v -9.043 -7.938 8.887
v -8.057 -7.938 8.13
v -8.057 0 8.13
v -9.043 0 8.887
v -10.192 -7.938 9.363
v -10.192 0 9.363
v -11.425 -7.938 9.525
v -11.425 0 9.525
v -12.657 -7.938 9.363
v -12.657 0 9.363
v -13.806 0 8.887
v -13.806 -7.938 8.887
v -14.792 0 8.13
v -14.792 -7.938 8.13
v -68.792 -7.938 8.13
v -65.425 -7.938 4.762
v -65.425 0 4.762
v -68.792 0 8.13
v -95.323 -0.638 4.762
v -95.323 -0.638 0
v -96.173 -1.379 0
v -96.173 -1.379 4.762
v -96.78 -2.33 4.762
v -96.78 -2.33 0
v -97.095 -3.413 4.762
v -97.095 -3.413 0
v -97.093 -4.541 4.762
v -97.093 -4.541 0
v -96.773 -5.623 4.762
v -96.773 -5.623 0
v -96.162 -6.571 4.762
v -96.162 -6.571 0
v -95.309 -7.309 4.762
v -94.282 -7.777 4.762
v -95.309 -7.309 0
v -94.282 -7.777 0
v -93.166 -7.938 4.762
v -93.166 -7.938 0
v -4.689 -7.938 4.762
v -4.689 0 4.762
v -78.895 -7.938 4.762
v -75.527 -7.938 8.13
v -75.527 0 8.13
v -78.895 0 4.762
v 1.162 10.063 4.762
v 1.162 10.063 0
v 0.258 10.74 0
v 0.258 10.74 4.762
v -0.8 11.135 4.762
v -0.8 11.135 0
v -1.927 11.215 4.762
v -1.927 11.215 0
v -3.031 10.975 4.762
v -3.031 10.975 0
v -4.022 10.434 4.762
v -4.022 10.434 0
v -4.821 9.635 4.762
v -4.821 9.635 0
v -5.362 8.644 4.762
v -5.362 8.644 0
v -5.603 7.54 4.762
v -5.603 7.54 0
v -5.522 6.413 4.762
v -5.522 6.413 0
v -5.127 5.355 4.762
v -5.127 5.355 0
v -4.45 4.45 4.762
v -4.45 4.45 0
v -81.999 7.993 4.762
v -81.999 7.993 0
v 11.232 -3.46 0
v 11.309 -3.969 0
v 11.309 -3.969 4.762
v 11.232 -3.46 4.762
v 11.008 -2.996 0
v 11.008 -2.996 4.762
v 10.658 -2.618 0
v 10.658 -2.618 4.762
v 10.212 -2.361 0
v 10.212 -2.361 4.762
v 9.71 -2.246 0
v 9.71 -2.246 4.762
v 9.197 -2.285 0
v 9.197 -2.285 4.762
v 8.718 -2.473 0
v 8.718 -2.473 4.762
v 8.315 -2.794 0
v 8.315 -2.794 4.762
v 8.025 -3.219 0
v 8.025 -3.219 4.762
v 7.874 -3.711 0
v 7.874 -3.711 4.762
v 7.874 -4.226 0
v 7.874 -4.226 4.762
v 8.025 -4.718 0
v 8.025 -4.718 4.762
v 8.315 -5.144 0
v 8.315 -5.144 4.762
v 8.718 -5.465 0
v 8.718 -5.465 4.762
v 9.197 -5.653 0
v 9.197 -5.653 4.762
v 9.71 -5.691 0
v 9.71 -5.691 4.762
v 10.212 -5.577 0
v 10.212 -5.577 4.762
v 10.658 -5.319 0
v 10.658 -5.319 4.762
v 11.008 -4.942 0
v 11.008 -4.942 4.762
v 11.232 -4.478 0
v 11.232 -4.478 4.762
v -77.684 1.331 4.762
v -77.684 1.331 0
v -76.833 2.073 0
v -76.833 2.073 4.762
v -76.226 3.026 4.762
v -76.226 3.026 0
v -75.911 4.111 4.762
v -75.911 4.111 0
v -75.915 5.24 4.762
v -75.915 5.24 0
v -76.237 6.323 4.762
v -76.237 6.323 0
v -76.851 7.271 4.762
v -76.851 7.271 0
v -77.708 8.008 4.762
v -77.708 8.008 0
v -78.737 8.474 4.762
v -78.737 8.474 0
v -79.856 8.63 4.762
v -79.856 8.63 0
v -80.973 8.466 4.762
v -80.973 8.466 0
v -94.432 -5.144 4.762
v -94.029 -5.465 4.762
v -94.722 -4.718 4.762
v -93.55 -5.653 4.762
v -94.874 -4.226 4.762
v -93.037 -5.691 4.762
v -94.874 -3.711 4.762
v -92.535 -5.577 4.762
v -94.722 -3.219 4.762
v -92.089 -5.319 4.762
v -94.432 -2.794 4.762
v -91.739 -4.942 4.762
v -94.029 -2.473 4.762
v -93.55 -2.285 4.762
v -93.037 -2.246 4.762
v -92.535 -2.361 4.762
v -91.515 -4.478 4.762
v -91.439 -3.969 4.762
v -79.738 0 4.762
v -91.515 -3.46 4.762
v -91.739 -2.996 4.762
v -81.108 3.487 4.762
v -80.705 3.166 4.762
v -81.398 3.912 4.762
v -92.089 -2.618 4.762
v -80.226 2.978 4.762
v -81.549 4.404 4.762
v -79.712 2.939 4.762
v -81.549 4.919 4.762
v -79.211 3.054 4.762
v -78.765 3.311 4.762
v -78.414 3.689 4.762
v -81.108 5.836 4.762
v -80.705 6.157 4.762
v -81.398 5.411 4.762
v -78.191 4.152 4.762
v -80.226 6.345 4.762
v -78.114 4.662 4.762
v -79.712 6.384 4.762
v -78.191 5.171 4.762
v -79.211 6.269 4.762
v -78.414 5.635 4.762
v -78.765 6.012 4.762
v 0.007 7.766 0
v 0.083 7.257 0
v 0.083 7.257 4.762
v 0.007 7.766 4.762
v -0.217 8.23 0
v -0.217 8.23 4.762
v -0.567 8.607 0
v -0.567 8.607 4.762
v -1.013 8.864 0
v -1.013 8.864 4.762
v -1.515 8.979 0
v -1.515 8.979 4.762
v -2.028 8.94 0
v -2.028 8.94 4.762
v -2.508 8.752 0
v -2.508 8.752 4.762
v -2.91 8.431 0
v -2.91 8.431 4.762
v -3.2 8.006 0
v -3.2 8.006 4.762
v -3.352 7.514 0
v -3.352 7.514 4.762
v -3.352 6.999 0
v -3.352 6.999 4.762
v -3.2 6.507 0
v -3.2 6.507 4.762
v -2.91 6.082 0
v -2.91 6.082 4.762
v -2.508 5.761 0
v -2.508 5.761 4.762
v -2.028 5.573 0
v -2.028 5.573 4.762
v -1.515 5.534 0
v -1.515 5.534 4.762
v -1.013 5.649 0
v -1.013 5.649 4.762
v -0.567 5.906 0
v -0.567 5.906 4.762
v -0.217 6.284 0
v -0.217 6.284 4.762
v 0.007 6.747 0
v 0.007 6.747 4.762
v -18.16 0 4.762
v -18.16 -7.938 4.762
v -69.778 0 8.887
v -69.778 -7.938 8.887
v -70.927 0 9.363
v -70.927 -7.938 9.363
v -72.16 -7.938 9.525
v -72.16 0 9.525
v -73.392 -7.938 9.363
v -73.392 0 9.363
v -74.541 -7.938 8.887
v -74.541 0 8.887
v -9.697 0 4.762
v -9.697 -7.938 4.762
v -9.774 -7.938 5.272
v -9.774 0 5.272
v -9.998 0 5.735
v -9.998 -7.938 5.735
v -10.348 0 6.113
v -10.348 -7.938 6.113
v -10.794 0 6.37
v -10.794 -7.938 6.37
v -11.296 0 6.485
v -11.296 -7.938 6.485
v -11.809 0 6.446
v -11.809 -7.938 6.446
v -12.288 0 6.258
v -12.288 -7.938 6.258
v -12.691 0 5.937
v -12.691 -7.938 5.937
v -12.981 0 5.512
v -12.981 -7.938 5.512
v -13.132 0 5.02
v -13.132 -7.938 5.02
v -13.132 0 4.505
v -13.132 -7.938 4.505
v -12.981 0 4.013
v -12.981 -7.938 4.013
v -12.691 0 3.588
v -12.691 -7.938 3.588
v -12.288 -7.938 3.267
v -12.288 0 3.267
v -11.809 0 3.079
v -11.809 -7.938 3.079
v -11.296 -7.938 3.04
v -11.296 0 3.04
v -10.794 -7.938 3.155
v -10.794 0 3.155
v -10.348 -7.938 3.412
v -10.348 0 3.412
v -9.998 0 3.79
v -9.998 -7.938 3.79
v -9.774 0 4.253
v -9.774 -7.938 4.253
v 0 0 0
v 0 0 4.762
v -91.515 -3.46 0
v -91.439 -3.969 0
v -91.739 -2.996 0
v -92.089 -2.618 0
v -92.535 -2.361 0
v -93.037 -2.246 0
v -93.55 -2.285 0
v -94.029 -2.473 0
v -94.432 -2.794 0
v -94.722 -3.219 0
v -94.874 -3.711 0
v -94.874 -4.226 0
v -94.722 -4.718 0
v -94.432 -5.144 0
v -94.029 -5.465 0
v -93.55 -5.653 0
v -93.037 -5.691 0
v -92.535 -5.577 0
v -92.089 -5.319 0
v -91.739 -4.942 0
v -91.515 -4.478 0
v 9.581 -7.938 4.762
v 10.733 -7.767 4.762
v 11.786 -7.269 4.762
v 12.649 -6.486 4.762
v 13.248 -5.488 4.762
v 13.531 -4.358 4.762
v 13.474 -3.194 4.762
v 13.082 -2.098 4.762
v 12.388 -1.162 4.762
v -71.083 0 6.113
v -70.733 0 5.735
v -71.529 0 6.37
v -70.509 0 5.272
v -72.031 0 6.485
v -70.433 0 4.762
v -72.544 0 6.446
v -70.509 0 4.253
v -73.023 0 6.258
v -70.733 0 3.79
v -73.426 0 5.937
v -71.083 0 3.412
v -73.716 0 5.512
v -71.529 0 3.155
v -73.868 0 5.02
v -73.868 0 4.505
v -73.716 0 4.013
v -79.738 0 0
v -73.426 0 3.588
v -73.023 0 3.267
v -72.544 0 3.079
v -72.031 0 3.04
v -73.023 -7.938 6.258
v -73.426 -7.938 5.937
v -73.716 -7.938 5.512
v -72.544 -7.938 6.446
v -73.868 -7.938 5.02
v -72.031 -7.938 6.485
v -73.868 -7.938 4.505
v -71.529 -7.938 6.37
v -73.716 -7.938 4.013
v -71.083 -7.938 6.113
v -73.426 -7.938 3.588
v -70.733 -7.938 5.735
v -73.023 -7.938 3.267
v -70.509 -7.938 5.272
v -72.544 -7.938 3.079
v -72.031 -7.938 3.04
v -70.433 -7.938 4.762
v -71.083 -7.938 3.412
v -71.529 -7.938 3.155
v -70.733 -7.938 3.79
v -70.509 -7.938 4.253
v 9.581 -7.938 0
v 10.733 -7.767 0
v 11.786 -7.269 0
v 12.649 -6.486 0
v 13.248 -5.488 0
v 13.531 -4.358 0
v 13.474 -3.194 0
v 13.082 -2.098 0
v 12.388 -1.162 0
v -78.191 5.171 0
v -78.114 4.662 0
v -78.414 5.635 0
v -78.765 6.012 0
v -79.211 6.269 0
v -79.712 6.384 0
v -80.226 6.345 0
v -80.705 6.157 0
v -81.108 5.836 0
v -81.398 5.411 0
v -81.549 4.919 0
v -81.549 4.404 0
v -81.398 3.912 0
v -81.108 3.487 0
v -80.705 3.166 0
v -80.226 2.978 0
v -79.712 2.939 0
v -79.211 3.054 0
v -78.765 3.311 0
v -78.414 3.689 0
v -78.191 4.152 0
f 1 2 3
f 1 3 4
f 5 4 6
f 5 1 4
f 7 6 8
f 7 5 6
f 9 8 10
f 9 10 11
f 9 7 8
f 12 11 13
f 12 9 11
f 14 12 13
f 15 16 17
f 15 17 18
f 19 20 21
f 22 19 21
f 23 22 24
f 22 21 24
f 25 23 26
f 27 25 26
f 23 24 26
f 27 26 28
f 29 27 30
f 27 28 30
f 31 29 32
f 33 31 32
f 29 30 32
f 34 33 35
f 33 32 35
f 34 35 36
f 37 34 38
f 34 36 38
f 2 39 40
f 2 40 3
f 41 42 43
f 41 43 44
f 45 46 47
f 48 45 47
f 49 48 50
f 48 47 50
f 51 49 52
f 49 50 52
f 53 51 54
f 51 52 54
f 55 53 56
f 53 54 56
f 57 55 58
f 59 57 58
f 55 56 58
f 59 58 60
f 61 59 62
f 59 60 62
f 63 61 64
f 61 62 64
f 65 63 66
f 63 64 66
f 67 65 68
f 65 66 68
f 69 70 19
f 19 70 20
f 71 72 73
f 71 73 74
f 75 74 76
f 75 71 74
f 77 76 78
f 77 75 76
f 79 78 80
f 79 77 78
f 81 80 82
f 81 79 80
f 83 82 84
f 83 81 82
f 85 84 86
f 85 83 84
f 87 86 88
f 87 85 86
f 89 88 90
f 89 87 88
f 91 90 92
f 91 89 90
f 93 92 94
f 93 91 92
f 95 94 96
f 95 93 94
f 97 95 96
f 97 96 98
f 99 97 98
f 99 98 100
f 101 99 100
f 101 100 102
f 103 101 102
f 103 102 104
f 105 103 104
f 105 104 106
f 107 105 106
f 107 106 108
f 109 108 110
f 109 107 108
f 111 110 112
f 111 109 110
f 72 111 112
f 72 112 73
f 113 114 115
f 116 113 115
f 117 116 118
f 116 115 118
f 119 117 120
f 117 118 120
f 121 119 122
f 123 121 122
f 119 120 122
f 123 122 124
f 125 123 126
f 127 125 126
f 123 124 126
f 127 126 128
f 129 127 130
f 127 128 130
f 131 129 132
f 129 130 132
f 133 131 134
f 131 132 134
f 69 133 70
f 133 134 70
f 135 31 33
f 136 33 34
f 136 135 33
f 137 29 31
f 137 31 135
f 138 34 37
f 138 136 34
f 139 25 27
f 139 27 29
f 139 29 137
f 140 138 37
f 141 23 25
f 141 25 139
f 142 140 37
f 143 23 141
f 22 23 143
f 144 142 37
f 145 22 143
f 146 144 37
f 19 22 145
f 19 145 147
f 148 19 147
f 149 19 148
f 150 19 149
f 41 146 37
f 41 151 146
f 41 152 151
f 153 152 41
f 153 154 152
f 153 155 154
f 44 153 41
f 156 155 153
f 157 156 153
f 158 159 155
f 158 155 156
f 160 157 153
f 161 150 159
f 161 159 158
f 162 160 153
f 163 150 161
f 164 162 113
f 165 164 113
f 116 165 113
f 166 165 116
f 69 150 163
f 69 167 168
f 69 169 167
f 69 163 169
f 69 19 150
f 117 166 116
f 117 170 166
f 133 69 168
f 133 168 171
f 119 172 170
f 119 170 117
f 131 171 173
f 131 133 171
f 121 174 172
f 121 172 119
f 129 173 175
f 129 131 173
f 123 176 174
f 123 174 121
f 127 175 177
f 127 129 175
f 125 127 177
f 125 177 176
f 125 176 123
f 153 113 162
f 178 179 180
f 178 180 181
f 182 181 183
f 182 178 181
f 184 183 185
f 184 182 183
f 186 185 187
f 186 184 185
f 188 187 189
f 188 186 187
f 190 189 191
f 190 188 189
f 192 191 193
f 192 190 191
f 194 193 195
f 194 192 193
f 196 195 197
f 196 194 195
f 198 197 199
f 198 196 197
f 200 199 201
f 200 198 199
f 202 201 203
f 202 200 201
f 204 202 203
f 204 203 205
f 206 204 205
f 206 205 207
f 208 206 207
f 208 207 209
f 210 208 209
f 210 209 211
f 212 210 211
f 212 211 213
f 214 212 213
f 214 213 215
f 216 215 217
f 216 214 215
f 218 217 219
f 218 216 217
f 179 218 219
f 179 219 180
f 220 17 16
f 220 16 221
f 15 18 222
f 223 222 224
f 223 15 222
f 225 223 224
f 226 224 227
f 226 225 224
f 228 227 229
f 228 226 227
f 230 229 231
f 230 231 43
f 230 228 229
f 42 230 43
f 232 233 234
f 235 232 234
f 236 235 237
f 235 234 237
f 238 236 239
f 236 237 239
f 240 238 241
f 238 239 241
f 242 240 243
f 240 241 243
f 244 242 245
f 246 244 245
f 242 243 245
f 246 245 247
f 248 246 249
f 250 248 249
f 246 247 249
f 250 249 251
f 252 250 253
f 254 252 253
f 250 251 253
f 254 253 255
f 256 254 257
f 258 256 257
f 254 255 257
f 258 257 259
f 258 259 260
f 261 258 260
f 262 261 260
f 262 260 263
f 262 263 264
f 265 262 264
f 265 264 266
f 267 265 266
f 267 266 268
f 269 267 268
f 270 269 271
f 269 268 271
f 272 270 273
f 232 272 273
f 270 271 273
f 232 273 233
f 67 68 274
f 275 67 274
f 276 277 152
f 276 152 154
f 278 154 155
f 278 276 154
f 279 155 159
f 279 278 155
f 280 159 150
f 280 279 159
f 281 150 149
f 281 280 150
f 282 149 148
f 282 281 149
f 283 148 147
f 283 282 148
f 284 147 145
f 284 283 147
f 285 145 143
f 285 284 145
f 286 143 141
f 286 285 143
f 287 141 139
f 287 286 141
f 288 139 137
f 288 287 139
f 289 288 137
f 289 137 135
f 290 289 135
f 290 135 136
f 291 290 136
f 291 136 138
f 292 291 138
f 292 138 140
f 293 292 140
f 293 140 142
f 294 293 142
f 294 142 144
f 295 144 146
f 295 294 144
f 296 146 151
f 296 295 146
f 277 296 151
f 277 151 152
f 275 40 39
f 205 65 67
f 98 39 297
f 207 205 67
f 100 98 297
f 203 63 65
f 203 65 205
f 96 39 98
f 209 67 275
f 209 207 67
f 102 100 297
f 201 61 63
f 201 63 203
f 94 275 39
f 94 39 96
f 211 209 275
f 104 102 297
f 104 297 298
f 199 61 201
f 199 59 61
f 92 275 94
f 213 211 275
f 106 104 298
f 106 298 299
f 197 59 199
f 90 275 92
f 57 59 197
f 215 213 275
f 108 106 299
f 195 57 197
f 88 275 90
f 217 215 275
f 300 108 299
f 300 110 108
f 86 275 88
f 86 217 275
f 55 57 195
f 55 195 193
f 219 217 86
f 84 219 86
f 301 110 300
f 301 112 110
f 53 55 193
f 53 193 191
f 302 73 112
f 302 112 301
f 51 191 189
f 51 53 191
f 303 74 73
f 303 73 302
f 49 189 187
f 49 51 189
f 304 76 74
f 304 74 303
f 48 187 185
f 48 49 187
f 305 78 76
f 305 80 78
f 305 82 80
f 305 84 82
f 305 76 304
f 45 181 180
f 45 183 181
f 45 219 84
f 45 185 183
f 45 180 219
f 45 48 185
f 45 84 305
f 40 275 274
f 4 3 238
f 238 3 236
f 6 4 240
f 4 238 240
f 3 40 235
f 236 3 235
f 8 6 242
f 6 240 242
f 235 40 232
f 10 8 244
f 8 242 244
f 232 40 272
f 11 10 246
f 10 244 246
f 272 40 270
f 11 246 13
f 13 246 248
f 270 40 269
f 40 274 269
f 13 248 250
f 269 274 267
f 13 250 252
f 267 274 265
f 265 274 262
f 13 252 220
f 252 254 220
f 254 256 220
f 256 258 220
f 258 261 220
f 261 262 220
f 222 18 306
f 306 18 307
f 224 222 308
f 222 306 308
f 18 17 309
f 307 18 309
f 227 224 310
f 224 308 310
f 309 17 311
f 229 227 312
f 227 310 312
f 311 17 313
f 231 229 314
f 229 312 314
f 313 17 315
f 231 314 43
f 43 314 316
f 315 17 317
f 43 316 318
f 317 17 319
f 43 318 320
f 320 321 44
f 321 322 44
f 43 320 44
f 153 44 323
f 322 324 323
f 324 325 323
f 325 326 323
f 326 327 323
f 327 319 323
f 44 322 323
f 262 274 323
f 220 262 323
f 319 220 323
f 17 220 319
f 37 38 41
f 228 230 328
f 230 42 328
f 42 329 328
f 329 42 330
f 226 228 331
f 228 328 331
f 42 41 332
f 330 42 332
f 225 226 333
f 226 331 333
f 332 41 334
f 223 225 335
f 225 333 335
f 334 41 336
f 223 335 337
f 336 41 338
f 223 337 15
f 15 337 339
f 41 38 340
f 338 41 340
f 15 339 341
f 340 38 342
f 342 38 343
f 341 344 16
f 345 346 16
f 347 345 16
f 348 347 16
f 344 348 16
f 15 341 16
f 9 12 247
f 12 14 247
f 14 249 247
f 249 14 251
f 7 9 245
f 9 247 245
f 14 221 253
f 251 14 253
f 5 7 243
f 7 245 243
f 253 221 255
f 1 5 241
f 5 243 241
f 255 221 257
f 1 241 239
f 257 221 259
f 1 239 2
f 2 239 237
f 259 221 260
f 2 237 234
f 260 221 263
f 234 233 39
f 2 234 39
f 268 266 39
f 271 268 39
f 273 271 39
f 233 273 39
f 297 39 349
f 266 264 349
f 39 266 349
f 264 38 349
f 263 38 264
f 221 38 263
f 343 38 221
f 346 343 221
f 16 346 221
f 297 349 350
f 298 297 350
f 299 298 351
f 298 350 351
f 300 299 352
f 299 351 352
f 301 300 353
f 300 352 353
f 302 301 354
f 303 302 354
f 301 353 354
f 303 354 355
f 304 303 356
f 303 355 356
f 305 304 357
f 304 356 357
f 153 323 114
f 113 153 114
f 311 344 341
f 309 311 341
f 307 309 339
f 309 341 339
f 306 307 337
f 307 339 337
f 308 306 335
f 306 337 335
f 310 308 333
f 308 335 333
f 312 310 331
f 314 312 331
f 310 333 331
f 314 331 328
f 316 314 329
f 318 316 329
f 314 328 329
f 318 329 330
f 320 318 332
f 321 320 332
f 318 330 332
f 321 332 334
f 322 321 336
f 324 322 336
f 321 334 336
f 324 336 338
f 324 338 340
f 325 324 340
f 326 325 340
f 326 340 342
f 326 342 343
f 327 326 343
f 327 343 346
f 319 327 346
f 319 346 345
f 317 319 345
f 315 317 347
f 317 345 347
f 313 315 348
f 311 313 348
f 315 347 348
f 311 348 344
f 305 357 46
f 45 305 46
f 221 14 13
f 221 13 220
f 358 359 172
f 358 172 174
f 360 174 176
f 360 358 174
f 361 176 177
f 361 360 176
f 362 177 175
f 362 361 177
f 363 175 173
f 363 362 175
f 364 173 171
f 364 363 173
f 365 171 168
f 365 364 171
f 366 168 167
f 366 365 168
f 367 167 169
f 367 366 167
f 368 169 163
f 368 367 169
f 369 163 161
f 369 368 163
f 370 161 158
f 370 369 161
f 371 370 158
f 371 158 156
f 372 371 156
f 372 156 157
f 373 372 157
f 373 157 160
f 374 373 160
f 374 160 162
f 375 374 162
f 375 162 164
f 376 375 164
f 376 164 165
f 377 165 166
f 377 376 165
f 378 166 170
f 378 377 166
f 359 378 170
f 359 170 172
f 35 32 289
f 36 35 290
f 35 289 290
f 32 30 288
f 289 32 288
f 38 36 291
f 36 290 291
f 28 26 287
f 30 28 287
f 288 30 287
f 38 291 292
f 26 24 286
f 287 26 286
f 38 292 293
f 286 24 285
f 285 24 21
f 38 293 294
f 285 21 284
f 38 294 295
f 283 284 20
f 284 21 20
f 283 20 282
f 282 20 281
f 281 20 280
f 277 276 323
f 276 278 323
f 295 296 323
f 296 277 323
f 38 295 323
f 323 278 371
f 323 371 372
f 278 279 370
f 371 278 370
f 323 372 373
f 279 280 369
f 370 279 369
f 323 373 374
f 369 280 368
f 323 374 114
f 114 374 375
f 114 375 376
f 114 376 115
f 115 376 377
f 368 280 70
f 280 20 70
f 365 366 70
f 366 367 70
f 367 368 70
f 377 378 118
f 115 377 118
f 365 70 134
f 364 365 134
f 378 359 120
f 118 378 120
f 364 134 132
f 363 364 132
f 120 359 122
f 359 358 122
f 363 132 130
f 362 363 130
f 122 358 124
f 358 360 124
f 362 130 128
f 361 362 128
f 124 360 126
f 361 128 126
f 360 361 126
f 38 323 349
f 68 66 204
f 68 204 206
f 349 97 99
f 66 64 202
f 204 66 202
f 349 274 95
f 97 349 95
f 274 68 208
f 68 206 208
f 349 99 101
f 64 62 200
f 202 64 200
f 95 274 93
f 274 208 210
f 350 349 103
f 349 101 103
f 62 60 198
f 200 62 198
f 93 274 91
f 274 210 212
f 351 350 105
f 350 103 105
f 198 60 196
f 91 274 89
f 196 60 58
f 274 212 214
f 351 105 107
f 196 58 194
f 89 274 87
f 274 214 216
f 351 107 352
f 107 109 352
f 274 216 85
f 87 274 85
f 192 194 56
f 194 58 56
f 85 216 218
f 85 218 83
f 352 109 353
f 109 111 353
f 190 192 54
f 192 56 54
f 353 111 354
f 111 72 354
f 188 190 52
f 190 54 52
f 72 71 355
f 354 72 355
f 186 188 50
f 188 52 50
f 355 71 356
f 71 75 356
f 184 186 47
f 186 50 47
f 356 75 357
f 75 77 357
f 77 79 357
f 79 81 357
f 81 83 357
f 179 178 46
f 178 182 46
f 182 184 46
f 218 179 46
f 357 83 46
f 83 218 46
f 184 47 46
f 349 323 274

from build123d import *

# Parameters (mm, degrees)
F0_R     = 1.7272
F1_DEPTH = 4.7625
F3_DEPTH = 7.9375
F4_R     = 1.7272
F5_DEPTH = 7.9375


with BuildPart() as f1:
    # F0 (on Top) → F1 (new body)
    with BuildSketch(Plane.XY):
        with BuildLine():
            Line((-4.4502401135, 4.4502401135), (0, 0))
            Line((0, 0), (-79.7381539824, 0))
            Line((-79.7381539824, 0), (-77.6839886087, 1.3305217617))
            ThreePointArc((-77.6839886087, 1.3305217617), (-76.5105259182, 6.8191407537), (-81.9991449101, 7.9926034442))
            Line((-81.9991449101, 7.9926034442), (-95.3233082751, -0.6377091588))
            ThreePointArc((-95.3233082751, -0.6377091588), (-96.9717152071, -5.0936740472), (-93.1657301243, -7.9375))
            Line((-93.1657301243, -7.9375), (9.5814100757, -7.9375))
            ThreePointArc((9.5814100757, -7.9375), (13.2480569703, -5.4875248722), (12.3877401135, -1.1624199622))
            Line((12.3877401135, -1.1624199622), (1.1624199622, 10.0629001892))
            ThreePointArc((1.1624199622, 10.0629001892), (-4.4502401135, 10.0629001892), (-4.4502401135, 4.4502401135))
        make_face()
        with Locations((-93.1657301243, -3.96875)):
            Circle(F0_R, mode=Mode.SUBTRACT)
        with Locations((9.5814100757, -3.96875)):
            Circle(F0_R, mode=Mode.SUBTRACT)
        with Locations((-79.8415667594, 4.661562603)):
            Circle(F0_R, mode=Mode.SUBTRACT)
        with Locations((-1.6439100757, 7.2565701513)):
            Circle(F0_R, mode=Mode.SUBTRACT)
    extrude(amount=F1_DEPTH)

    # F2 (on face) → F3 (join, through all)
    with BuildSketch(Plane.XZ.offset(7.9375)):
        with BuildLine():
            Line((-78.8949317151, 4.7625), (-72.1597396243, 4.7625))
            Line((-72.1597396243, 4.7625), (-65.4245475335, 4.7625))
            Line((-65.4245475335, 4.7625), (-68.7921435789, 8.1300960454))
            ThreePointArc((-68.7921435789, 8.1300960454), (-72.1597396243, 9.525), (-75.5273356697, 8.1300960454))
            Line((-75.5273356697, 8.1300960454), (-78.8949317151, 4.7625))
        make_face()
        with BuildLine():
            Line((-18.1597725151, 4.7625), (-11.4245804243, 4.7625))
            Line((-11.4245804243, 4.7625), (-4.6893883335, 4.7625))
            Line((-4.6893883335, 4.7625), (-8.0569843789, 8.1300960454))
            ThreePointArc((-8.0569843789, 8.1300960454), (-11.4245804243, 9.525), (-14.7921764697, 8.1300960454))
            Line((-14.7921764697, 8.1300960454), (-18.1597725151, 4.7625))
        make_face()
    extrude(amount=-F3_DEPTH)

    # F4 (on face) → F5 (cut, through all)
    with BuildSketch(Plane.XZ.offset(7.9375)):
        with Locations((-72.1597396243, 4.7625)):
            Circle(F4_R)
        with Locations((-11.4245804243, 4.7625)):
            Circle(F4_R)
    extrude(amount=-F5_DEPTH, mode=Mode.SUBTRACT)


solid = f1.part
